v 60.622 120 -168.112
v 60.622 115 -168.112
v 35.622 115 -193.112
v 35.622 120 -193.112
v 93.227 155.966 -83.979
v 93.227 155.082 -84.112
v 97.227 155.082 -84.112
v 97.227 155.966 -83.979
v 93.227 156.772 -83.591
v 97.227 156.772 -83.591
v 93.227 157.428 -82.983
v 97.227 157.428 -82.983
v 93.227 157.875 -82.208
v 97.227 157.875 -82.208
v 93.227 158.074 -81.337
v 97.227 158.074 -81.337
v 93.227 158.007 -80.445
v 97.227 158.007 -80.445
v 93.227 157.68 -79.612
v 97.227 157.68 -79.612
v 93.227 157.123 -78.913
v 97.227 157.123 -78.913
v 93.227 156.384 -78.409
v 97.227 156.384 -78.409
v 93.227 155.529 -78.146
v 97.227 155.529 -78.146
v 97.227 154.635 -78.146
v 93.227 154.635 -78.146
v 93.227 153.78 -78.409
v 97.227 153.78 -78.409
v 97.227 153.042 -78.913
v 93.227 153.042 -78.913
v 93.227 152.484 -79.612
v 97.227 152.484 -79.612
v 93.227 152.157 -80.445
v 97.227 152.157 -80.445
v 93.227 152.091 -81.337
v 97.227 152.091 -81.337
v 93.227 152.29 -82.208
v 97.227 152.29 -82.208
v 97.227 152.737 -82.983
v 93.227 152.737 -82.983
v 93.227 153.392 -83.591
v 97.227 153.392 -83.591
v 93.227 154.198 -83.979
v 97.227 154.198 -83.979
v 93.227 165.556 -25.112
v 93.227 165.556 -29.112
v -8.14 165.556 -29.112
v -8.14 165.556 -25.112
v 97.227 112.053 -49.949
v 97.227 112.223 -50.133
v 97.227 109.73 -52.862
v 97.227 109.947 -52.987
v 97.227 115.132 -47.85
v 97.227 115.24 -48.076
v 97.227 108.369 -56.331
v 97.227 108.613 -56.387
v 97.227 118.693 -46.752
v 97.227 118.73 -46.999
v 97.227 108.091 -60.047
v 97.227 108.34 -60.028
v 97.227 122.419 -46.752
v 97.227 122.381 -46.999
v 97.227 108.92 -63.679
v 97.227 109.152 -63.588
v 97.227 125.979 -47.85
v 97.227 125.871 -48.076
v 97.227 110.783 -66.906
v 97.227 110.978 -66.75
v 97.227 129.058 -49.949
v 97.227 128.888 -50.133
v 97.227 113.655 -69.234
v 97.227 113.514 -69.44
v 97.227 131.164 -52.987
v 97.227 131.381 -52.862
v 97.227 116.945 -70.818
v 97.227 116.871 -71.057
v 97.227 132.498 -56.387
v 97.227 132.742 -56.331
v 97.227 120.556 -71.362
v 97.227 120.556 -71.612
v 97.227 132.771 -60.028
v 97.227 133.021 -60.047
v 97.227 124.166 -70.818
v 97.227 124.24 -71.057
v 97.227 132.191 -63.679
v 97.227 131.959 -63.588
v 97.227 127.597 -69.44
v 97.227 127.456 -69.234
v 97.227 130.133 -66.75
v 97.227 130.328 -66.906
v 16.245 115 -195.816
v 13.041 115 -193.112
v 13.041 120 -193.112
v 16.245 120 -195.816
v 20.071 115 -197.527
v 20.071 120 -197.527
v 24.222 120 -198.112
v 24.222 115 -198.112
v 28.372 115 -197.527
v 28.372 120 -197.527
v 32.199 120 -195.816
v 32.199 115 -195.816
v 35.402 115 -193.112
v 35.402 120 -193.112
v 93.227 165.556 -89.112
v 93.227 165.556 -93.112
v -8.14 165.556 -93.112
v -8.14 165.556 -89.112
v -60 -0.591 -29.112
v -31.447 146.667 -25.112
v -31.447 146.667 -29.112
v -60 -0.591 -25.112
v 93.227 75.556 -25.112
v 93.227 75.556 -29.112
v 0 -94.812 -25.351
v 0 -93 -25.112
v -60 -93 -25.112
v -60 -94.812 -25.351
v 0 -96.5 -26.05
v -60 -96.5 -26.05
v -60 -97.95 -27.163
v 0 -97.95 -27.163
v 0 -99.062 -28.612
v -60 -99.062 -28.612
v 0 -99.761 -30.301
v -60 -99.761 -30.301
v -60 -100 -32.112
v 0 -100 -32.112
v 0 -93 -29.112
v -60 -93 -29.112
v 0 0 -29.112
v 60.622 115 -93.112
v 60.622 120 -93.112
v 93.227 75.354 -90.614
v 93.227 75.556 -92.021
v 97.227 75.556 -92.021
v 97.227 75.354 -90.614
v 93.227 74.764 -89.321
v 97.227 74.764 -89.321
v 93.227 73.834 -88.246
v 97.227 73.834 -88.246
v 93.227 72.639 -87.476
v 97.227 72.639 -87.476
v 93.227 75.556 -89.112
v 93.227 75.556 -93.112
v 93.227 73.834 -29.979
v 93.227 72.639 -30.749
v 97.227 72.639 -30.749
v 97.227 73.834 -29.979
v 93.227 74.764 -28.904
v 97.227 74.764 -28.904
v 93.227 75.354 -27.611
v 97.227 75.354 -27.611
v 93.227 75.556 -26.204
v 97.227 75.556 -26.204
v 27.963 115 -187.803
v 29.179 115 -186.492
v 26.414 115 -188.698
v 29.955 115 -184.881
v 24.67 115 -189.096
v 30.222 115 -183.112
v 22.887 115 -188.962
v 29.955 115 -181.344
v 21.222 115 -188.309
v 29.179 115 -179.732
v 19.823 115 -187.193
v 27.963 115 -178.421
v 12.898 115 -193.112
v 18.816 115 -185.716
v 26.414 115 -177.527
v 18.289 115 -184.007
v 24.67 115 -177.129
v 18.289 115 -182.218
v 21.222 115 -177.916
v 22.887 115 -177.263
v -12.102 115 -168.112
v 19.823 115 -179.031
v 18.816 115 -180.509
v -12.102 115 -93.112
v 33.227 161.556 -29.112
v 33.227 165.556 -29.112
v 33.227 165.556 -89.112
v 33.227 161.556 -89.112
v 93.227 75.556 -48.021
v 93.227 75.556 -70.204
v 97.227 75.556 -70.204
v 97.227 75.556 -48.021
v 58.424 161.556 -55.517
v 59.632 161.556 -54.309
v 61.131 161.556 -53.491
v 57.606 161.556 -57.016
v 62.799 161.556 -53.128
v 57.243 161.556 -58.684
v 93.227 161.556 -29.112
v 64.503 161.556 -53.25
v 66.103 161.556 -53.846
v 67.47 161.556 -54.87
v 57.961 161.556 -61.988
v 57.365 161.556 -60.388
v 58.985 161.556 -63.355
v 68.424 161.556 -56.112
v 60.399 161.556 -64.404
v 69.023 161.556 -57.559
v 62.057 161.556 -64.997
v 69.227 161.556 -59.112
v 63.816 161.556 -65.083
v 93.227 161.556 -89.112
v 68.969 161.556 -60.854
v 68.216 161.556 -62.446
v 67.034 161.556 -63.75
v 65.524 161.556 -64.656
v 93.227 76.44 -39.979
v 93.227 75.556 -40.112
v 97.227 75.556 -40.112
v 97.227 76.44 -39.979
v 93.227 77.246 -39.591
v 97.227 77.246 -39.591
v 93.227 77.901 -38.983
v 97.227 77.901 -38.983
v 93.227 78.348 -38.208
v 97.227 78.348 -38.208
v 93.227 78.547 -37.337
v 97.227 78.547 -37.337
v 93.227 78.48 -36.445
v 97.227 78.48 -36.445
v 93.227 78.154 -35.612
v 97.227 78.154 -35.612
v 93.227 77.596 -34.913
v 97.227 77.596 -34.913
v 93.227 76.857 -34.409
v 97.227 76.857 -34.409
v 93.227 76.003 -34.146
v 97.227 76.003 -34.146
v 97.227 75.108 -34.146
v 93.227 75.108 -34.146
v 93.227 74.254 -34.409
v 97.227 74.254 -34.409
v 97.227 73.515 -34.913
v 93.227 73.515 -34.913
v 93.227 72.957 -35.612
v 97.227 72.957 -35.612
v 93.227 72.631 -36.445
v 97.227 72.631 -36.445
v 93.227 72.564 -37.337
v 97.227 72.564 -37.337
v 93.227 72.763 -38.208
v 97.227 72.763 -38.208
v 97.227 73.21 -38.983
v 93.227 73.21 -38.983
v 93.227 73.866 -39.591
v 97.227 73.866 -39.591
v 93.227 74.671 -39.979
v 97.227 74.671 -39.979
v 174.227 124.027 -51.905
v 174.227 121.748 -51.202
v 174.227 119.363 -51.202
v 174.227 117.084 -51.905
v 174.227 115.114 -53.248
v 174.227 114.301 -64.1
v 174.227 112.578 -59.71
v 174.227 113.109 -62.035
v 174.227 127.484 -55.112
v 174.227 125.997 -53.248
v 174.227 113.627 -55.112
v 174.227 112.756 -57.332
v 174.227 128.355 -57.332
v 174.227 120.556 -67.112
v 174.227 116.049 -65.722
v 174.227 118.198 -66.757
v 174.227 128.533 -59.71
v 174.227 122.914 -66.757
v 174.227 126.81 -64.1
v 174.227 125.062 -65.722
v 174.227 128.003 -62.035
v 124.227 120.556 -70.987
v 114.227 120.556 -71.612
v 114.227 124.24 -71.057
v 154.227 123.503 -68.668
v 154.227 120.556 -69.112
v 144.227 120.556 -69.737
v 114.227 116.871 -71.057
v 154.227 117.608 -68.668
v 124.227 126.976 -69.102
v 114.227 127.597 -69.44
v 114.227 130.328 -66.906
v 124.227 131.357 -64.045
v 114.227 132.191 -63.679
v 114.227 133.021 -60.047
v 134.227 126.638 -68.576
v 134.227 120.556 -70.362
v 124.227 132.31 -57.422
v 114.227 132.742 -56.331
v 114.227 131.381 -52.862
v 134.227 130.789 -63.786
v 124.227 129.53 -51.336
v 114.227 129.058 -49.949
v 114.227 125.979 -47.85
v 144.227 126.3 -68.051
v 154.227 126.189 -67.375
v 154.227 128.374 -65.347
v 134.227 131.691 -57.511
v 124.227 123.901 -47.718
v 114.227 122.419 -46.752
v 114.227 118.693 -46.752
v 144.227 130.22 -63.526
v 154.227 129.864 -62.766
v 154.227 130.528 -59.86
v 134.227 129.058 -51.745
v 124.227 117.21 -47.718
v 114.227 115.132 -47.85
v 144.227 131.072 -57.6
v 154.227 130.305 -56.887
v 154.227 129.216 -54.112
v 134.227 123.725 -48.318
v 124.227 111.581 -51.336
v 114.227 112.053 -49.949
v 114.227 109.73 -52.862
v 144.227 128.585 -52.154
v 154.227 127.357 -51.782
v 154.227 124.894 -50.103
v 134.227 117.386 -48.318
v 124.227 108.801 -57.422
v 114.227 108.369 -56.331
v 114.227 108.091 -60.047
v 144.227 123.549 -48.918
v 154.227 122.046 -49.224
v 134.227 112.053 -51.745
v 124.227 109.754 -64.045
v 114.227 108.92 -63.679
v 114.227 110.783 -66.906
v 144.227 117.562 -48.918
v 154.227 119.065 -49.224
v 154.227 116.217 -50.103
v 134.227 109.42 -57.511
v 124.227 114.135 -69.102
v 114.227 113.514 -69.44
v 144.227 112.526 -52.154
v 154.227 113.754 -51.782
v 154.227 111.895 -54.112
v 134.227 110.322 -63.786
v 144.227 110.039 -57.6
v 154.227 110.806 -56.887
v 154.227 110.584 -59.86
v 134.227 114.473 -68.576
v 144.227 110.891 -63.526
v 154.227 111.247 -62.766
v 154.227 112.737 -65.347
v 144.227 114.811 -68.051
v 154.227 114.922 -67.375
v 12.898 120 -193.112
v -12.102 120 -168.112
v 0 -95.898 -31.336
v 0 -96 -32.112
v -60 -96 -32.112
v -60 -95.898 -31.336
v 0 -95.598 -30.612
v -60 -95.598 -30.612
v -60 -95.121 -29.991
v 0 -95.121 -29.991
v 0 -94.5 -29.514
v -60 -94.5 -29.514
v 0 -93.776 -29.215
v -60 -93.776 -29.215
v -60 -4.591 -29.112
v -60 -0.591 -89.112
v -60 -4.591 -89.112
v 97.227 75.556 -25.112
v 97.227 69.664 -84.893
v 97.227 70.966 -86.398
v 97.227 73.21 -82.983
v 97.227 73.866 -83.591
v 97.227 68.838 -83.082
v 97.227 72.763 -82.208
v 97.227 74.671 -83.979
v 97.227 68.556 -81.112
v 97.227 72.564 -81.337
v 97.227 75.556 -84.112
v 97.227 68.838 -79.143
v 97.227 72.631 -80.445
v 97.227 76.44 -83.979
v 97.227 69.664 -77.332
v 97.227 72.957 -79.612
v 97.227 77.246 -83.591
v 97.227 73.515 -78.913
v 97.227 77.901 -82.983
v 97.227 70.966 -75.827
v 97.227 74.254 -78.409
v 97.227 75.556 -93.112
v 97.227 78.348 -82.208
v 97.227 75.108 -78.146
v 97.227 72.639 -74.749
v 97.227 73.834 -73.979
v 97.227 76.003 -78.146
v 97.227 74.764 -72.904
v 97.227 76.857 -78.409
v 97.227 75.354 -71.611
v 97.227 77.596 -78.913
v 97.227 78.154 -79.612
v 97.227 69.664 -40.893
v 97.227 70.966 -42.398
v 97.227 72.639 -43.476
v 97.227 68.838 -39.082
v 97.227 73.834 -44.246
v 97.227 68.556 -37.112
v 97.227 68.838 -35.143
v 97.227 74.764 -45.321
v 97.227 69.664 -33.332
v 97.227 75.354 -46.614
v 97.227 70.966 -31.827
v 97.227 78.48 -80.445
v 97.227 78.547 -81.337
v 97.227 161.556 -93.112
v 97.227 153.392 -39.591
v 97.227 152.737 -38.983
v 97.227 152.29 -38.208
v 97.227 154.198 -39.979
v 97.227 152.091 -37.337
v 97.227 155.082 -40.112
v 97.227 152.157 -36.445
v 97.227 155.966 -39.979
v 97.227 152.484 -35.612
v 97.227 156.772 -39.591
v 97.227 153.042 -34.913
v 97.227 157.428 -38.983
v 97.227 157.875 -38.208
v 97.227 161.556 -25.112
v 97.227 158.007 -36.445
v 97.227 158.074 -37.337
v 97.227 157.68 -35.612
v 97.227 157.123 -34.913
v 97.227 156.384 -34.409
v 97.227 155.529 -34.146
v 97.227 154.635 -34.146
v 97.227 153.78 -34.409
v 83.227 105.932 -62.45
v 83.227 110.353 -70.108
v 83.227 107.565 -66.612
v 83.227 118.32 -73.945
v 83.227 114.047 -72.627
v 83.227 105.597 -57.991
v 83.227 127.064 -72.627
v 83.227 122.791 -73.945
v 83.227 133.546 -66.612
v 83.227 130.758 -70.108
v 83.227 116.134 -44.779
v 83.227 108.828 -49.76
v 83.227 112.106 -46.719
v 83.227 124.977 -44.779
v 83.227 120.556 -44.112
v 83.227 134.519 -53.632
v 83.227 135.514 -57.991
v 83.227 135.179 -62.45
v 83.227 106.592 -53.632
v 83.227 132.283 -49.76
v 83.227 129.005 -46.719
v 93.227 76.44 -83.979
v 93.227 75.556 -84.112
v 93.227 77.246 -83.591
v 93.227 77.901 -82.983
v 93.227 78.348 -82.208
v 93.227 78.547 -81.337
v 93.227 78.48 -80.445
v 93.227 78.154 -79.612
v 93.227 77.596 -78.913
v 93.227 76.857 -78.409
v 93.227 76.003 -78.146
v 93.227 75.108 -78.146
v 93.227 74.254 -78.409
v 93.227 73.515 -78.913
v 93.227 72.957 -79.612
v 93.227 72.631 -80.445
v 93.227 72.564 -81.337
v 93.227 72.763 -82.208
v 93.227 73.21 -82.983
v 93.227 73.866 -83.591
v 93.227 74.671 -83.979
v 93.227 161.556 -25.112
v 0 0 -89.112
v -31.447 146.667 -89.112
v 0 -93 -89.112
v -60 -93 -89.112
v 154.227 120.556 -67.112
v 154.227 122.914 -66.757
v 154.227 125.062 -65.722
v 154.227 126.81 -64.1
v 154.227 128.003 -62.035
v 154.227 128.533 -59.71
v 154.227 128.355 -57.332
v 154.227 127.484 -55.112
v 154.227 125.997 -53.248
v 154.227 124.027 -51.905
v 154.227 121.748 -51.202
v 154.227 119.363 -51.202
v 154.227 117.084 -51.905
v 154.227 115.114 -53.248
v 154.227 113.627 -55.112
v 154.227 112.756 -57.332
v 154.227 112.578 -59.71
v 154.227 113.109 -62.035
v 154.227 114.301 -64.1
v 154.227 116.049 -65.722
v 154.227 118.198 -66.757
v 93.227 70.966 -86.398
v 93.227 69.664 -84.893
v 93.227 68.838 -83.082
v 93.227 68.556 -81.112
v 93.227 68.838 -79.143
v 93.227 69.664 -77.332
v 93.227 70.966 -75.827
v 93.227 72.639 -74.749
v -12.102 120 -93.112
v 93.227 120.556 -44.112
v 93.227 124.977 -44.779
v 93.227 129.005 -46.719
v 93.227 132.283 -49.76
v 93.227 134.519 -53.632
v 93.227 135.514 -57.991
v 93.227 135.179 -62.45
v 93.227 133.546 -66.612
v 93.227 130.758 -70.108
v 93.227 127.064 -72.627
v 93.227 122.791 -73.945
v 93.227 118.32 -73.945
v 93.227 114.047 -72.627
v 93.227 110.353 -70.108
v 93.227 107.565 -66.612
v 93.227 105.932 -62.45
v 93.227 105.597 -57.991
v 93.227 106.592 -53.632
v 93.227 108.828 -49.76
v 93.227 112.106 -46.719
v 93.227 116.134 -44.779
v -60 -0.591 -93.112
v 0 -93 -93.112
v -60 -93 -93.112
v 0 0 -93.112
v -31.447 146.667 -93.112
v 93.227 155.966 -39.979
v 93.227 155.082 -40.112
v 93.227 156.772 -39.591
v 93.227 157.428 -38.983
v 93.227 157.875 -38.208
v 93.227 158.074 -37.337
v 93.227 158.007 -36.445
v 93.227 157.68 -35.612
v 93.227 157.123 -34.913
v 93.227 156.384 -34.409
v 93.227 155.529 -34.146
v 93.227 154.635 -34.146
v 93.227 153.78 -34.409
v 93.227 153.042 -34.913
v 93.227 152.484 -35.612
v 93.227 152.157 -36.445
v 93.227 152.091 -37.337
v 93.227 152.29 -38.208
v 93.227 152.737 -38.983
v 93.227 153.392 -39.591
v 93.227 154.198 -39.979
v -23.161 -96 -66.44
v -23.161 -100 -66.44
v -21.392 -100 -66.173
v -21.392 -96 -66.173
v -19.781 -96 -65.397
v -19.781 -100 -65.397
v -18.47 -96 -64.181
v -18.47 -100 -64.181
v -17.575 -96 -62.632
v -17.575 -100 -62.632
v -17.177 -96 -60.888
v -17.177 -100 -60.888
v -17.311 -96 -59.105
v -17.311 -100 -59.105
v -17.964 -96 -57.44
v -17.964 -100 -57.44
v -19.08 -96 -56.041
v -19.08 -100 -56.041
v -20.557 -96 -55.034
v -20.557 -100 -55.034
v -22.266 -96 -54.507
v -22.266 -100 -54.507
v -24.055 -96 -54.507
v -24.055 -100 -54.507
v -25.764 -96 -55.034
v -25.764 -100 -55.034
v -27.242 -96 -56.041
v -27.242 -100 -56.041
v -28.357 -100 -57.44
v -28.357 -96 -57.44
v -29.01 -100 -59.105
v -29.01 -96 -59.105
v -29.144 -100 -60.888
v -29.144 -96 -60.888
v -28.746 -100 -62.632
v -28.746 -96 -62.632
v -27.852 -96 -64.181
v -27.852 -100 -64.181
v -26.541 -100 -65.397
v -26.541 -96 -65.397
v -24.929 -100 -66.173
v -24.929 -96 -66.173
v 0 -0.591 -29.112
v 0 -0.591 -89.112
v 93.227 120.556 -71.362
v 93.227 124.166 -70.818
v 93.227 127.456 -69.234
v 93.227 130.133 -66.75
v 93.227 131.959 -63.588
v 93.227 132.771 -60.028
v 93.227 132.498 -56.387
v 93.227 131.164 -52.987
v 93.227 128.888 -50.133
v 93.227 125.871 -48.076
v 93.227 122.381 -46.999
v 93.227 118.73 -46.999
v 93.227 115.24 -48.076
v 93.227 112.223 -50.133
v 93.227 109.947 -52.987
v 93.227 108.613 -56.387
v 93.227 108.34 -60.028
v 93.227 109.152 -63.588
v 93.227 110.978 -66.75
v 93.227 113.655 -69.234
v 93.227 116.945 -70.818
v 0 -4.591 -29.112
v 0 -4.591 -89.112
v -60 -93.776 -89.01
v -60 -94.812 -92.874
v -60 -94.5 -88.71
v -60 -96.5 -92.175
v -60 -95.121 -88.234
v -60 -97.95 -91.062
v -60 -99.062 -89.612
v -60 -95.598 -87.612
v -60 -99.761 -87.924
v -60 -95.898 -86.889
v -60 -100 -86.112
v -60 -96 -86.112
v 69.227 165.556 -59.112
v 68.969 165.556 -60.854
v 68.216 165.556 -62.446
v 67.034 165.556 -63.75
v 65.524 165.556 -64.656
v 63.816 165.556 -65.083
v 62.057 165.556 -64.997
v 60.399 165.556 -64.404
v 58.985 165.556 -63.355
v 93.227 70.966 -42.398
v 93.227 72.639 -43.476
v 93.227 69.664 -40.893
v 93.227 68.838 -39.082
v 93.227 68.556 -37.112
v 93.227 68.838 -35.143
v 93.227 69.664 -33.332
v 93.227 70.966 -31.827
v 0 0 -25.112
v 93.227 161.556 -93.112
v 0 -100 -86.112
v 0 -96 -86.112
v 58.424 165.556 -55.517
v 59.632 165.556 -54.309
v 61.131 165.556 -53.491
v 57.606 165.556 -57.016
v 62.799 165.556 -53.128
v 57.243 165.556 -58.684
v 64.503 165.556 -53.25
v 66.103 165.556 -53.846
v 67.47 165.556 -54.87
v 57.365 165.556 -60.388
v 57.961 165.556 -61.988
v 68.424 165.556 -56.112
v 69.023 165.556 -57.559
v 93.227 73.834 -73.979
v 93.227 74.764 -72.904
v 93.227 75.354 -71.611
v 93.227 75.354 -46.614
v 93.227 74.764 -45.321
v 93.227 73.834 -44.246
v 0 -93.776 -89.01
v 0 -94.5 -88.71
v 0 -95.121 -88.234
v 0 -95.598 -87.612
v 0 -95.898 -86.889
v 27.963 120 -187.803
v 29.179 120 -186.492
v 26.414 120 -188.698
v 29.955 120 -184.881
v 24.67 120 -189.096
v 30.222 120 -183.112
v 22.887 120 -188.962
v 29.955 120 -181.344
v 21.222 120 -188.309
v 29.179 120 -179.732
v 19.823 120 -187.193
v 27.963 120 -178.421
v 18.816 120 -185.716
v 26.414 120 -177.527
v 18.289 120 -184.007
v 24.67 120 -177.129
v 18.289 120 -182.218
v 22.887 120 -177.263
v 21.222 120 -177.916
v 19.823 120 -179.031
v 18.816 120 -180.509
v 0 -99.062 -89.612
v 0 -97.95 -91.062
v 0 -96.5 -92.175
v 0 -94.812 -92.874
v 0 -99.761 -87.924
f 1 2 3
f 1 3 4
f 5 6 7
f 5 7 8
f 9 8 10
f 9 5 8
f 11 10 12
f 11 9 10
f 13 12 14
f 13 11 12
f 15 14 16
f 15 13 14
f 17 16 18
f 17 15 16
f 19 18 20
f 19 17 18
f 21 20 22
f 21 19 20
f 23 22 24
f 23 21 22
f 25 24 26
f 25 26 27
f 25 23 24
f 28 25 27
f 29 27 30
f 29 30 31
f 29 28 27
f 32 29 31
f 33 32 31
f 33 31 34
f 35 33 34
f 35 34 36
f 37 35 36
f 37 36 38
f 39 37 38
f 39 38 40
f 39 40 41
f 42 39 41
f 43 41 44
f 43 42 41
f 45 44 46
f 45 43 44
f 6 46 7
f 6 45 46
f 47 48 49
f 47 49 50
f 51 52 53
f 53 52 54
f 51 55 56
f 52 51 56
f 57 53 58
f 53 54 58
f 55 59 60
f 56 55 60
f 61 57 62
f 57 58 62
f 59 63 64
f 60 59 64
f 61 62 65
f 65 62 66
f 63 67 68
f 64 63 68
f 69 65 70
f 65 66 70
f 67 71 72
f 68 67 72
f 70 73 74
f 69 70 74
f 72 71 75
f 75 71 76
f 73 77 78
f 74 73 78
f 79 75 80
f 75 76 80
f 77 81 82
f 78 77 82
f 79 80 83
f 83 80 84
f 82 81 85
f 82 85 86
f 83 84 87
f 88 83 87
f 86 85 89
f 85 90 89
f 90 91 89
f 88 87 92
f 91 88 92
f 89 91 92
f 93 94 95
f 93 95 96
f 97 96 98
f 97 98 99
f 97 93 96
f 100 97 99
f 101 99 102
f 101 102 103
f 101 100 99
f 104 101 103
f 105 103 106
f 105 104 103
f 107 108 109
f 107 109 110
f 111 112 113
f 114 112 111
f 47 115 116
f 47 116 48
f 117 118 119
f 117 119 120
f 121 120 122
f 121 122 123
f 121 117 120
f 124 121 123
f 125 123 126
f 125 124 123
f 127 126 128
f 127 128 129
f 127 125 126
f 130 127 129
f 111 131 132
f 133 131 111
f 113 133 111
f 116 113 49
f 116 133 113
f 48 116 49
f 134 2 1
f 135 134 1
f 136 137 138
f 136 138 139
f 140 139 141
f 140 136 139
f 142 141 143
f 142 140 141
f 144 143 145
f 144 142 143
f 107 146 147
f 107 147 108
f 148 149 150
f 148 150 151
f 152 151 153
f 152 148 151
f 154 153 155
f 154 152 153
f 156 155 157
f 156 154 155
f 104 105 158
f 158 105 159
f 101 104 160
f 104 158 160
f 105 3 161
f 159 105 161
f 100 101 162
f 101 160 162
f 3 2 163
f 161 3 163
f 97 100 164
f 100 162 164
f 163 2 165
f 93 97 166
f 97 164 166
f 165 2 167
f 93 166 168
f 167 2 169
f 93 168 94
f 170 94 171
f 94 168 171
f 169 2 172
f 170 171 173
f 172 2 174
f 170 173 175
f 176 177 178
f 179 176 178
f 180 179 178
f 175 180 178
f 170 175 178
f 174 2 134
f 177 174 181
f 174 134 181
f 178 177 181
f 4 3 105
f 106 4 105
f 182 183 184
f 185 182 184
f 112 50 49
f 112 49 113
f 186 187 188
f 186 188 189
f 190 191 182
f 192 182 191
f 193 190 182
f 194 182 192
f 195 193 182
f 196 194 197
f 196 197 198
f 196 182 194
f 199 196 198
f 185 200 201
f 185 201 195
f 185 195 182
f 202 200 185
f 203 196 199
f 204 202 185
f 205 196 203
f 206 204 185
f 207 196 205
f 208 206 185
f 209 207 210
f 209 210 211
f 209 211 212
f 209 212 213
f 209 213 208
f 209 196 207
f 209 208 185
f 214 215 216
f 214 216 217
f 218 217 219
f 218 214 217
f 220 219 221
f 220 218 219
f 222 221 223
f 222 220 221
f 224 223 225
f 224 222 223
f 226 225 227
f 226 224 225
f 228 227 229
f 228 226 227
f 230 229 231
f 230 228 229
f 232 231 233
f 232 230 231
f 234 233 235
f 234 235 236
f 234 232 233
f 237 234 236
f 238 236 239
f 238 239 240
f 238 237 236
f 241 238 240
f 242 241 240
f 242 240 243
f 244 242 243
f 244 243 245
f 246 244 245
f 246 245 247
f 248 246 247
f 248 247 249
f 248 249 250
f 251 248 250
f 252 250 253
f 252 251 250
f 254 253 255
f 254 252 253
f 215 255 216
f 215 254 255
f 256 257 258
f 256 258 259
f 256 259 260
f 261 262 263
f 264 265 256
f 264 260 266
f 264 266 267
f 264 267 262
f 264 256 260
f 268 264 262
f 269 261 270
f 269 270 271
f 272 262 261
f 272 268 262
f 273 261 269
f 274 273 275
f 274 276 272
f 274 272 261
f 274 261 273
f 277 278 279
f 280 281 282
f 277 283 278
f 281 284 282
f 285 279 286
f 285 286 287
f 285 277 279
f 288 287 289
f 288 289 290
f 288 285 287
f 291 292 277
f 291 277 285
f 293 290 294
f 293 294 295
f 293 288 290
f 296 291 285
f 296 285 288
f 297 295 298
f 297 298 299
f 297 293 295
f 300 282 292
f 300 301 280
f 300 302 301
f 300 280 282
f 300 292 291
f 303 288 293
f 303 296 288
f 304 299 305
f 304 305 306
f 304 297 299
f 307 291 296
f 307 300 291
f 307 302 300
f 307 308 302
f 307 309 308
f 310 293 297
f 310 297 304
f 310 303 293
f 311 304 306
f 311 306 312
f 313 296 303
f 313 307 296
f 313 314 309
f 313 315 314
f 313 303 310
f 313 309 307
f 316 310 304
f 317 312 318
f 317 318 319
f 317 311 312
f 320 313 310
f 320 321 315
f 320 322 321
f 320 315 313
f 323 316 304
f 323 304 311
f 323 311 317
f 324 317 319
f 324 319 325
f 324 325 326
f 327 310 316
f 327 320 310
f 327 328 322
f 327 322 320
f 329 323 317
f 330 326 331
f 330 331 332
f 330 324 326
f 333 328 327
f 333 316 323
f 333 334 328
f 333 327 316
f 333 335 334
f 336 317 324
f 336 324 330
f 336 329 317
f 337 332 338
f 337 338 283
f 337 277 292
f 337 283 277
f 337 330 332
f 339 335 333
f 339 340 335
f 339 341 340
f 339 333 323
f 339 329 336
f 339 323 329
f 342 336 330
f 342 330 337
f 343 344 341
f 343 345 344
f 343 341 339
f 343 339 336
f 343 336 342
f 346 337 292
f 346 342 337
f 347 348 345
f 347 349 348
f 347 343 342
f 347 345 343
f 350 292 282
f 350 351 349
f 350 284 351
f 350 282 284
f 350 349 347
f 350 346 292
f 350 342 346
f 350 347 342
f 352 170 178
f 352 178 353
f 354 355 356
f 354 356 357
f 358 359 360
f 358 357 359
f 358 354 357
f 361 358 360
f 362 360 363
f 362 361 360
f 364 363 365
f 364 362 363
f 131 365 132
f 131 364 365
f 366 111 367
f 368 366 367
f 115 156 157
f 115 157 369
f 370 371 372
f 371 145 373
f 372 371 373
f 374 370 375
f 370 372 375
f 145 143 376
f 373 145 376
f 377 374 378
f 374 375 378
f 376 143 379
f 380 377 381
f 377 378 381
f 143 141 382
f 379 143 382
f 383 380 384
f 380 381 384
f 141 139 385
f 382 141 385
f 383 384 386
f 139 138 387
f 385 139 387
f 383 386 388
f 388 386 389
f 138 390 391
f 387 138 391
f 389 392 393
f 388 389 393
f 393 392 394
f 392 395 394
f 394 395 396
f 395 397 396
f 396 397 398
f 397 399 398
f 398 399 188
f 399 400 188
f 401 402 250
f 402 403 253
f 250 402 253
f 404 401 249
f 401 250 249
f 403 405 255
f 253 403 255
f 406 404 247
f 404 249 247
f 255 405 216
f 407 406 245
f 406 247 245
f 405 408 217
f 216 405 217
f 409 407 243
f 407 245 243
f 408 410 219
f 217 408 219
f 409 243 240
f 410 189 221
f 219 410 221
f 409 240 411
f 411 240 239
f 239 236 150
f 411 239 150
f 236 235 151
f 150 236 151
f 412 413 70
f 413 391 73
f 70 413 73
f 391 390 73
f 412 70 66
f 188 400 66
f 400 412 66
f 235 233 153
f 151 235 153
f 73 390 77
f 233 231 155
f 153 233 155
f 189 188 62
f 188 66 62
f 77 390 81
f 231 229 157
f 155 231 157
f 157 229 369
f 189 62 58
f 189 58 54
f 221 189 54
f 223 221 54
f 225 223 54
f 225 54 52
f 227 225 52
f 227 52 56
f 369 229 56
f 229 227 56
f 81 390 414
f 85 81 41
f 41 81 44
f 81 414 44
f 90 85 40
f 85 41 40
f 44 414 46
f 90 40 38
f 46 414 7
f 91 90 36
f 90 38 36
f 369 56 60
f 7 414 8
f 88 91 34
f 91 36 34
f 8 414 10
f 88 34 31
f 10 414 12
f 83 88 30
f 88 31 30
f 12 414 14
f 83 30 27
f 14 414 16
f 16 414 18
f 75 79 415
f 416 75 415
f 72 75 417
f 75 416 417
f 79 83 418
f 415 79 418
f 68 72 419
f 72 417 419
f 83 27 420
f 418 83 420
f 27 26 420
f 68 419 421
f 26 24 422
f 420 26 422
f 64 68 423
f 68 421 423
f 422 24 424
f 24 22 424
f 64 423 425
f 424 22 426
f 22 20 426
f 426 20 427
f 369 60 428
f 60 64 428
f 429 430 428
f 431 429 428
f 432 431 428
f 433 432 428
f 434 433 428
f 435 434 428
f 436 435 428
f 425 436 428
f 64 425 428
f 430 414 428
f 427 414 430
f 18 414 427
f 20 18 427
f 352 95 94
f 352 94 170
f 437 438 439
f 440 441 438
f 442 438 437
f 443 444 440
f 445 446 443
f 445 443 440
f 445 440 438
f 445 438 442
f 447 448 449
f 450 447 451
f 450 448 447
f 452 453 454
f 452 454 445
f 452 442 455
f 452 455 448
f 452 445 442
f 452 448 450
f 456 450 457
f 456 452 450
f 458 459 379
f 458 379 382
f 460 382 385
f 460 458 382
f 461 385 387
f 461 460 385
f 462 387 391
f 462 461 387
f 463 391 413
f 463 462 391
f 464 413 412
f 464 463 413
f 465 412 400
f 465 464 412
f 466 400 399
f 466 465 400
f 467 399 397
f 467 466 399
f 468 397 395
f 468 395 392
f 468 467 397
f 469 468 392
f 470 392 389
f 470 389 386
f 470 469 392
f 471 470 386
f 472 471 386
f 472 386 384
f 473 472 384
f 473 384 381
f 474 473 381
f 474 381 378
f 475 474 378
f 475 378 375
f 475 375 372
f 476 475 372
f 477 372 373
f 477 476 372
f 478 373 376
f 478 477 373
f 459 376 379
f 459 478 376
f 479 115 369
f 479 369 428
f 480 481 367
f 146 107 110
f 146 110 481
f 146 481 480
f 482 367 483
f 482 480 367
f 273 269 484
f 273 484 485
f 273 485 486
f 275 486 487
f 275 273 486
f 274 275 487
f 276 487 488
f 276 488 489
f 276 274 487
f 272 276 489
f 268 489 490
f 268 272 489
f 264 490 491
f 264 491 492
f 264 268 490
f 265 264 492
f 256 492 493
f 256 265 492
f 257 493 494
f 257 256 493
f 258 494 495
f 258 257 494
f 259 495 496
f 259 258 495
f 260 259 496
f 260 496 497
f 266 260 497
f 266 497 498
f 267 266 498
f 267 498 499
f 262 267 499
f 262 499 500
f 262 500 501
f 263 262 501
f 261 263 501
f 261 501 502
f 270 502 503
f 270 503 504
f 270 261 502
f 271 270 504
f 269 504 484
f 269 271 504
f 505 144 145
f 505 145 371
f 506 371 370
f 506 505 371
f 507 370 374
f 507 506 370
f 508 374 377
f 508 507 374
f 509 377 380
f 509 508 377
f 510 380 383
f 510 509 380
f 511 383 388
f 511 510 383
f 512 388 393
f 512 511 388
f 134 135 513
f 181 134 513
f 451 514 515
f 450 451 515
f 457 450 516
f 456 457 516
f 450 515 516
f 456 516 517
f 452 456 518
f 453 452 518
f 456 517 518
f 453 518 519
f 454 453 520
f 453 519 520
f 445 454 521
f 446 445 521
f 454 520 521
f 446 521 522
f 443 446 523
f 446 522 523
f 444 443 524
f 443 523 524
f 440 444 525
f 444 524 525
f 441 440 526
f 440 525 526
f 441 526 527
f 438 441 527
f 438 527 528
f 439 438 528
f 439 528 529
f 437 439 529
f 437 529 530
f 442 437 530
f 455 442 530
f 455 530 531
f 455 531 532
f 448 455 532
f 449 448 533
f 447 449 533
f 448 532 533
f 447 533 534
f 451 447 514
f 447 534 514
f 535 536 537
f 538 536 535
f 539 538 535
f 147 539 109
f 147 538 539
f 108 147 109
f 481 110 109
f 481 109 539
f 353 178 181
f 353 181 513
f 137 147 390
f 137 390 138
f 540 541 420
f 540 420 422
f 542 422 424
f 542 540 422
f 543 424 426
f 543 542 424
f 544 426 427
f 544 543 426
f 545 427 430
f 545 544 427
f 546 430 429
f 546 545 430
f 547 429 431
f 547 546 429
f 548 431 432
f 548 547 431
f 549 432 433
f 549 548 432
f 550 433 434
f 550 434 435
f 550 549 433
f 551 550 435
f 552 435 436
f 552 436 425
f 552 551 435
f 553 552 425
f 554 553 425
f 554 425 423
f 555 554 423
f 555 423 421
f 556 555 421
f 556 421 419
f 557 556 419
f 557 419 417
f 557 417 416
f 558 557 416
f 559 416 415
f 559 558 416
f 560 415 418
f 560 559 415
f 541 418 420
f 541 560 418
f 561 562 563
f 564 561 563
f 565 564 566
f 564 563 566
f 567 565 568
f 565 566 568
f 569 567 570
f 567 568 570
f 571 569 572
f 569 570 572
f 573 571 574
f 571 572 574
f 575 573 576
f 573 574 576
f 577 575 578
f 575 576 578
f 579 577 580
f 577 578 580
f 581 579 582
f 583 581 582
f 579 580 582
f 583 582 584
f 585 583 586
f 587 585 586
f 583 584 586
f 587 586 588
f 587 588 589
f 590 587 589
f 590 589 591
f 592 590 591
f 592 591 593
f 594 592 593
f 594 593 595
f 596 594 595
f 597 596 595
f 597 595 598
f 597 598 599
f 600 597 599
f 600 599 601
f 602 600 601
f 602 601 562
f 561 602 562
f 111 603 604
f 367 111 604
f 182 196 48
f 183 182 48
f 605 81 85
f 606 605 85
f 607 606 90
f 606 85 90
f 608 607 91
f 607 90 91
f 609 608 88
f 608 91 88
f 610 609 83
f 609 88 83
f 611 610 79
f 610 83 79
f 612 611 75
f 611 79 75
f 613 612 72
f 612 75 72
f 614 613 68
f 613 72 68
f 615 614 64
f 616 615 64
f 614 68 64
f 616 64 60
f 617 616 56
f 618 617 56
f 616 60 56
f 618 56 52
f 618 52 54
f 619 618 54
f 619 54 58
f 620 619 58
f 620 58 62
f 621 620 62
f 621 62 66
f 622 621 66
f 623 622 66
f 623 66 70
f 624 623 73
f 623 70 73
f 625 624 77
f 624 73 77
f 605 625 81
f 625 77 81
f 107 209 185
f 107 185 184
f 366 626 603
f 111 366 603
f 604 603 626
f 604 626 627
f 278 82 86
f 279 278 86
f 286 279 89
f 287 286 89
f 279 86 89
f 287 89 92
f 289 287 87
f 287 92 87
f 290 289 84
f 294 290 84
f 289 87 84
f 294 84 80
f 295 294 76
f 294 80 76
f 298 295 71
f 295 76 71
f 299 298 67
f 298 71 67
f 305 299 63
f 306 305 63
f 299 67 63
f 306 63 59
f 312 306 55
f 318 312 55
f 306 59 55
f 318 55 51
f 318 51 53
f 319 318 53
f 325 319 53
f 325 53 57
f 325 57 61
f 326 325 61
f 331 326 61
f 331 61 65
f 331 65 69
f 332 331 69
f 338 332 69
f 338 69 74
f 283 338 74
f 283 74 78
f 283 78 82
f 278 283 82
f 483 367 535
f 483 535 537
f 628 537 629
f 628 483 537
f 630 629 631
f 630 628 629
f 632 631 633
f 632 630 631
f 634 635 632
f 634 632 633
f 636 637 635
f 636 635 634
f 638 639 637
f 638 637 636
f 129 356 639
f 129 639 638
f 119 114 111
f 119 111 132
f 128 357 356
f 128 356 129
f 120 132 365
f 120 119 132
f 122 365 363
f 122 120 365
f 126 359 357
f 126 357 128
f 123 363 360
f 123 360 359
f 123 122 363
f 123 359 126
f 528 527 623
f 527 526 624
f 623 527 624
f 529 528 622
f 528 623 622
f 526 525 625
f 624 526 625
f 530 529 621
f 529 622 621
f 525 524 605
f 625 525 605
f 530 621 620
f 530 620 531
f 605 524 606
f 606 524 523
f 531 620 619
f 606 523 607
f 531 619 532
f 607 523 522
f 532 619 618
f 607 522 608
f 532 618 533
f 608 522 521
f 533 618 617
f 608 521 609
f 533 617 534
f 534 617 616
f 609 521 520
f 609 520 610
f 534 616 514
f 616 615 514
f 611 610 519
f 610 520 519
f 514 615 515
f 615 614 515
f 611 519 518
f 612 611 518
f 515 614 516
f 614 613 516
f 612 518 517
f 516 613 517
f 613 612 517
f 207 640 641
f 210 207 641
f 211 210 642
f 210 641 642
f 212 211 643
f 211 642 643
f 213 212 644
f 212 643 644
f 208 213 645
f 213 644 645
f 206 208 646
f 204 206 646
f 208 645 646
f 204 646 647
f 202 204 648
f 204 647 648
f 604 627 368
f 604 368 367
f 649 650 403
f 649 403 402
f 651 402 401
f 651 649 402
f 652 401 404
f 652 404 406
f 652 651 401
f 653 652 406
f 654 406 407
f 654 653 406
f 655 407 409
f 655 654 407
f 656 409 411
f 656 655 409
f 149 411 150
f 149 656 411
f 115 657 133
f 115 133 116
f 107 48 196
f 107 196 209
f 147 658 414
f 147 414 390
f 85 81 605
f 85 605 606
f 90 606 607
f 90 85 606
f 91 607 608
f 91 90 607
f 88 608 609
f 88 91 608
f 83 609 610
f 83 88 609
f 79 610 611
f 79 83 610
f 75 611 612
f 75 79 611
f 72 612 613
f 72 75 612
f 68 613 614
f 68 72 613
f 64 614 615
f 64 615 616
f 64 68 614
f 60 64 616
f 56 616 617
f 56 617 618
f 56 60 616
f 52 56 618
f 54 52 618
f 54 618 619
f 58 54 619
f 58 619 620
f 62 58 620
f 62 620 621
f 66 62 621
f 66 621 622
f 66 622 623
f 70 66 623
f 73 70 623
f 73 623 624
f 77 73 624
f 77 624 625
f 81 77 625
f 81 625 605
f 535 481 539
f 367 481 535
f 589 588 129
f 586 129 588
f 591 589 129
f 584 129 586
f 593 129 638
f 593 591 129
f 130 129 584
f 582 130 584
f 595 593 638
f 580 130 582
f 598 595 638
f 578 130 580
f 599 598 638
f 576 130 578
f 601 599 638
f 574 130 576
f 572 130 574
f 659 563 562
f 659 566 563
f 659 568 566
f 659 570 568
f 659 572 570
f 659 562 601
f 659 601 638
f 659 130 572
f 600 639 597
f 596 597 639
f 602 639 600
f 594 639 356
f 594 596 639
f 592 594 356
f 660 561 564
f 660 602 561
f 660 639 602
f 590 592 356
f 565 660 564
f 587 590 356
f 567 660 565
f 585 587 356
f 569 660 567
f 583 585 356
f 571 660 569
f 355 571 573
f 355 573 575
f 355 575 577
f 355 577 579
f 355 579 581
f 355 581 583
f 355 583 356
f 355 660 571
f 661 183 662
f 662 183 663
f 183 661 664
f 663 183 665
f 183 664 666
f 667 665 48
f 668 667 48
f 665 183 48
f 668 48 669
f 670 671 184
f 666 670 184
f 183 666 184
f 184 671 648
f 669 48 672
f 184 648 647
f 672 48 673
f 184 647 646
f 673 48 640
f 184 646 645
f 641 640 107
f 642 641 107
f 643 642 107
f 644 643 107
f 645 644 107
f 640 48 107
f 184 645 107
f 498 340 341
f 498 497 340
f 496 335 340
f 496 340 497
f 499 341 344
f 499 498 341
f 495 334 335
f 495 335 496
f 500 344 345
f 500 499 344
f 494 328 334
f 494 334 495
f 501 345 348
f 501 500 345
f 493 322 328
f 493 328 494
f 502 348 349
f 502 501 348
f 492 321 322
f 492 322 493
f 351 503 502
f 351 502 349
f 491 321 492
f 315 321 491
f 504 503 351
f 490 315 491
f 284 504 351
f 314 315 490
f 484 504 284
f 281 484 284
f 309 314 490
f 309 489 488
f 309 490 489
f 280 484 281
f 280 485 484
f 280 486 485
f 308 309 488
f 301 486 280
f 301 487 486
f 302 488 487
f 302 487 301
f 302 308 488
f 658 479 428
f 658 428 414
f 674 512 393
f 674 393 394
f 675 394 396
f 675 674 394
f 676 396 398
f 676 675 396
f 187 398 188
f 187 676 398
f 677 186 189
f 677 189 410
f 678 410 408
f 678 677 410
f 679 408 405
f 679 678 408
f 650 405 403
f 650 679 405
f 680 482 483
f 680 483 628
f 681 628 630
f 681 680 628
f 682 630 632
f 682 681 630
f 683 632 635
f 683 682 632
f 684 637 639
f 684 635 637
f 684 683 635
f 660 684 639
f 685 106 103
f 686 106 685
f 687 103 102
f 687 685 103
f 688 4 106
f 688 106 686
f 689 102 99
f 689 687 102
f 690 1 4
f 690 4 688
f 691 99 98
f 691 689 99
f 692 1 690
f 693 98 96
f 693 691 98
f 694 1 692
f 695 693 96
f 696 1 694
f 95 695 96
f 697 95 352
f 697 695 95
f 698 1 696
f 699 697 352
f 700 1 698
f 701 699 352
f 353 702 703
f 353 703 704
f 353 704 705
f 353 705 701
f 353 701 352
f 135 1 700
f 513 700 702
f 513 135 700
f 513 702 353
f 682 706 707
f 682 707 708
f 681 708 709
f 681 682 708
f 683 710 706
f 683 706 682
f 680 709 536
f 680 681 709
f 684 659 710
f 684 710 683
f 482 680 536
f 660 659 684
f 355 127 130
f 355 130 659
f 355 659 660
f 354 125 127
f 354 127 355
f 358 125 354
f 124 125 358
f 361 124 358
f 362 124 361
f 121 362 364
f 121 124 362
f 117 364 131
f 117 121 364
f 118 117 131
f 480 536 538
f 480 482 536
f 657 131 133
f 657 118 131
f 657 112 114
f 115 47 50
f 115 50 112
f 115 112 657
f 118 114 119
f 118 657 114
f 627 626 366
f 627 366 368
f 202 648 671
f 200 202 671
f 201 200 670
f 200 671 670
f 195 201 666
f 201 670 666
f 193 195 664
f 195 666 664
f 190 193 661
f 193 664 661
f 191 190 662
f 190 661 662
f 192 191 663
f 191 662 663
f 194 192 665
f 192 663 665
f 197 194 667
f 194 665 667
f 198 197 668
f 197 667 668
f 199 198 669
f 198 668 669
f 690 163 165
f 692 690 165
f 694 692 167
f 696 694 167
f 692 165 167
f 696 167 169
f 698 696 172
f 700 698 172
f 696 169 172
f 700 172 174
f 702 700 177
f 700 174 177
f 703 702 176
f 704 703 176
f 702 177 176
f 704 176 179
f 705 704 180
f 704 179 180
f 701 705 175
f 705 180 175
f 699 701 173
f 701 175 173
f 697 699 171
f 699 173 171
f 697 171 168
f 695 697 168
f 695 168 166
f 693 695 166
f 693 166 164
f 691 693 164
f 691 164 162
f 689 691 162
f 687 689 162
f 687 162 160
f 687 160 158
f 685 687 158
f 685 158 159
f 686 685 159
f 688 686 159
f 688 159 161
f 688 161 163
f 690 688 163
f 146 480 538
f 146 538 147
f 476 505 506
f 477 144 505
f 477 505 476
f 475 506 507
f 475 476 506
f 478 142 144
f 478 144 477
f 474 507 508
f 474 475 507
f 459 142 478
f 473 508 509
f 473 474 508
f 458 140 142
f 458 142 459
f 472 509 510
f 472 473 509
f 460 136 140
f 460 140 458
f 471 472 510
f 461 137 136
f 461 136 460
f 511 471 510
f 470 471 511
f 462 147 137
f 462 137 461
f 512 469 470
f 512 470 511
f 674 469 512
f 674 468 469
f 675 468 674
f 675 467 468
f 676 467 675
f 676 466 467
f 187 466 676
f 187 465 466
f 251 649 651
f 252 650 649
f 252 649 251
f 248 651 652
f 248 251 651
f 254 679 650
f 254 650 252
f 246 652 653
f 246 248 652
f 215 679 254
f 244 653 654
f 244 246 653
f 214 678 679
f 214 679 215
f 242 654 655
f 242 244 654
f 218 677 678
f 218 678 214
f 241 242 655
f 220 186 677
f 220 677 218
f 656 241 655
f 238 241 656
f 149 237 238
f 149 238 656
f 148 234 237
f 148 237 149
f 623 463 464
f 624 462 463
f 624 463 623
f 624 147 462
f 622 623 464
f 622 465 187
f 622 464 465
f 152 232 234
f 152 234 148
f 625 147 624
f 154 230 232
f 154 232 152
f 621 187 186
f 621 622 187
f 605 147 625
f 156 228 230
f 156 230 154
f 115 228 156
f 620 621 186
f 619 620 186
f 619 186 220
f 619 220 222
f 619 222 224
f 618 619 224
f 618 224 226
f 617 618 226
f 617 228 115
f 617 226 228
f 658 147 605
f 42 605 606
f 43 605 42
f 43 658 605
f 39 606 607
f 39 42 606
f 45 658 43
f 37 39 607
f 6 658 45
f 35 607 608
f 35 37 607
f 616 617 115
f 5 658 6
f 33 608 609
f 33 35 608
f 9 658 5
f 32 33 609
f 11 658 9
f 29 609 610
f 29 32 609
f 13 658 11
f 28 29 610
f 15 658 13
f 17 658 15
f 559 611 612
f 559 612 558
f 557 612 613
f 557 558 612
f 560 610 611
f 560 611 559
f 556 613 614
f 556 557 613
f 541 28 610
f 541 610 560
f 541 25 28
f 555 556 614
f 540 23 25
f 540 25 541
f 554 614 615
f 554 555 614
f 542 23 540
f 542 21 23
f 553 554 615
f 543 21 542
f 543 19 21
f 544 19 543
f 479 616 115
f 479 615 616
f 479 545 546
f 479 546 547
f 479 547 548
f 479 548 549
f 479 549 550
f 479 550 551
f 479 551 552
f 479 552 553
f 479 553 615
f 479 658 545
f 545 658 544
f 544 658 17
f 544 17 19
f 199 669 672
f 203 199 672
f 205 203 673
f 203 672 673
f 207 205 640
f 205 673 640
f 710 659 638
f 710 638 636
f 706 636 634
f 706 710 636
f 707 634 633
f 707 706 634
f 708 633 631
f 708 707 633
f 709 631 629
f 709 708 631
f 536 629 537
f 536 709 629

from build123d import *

# Parameters (mm, degrees)
BOSS_EXTRUDE2_DEPTH  = 107
CUT_EXTRUDE1_DEPTH   = 214
SKETCH5_W            = 60
SKETCH5_H            = 4
BOSS_EXTRUDE3_DEPTH  = 60
SKETCH6_W            = 60
SKETCH6_H            = 4
BOSS_EXTRUDE4_DEPTH  = 60
SKETCH7_R            = 3
BOSS_EXTRUDE5_DEPTH  = 4
SKETCH8_W            = 72.723840611
SKETCH8_H            = 5
BOSS_EXTRUDE6_DEPTH  = 100
CHAMFER1_SIZE        = 25
CHAMFER2_SIZE        = 25
SKETCH9_R            = 15
BOSS_EXTRUDE7_DEPTH  = 5
SKETCH10_R           = 12.25
CUT_EXTRUDE2_DEPTH   = 4
CUT_EXTRUDE5_DEPTH   = 8
SKETCH13_R           = 6
CUT_EXTRUDE6_DEPTH   = 10
SKETCH15_R           = 15
BOSS_EXTRUDE8_DEPTH  = 10
SKETCH16_R           = 12.25
BOSS_EXTRUDE9_DEPTH  = 10
SKETCH17_R           = 12.5
BOSS_EXTRUDE10_DEPTH = 77
SKETCH18_R           = 12.5
SKETCH18_R_2         = 8
CUT_EXTRUDE7_DEPTH   = 20
CHAMFER3_SIZE        = 40
CHAMFER3_SIZE2       = 2.5
SKETCH19_R           = 6
CUT_EXTRUDE8_DEPTH   = 20


with BuildPart() as part:
    # Sketch3 → Boss-Extrude2 (new, symmetric)
    with BuildSketch(Plane(origin=(0, 0, 0), x_dir=(0, 0, -1), z_dir=(1, 0, 0))):
        with BuildLine():
            Line((93.112387021, -93), (93.112387021, 165.555555556))
            Line((93.112387021, 165.555555556), (89.112387021, 165.555555556))
            Line((89.112387021, 165.555555556), (89.112387021, -93))
            ThreePointArc((89.112387021, -93), (88.233707365, -95.121320344), (86.112387021, -96))
            Line((86.112387021, -96), (32.112387021, -96))
            ThreePointArc((32.112387021, -96), (29.991066678, -95.121320344), (29.112387021, -93))
            Line((29.112387021, -93), (29.112387021, 165.555555556))
            Line((29.112387021, 165.555555556), (25.112387021, 165.555555556))
            Line((25.112387021, 165.555555556), (25.112387021, -93))
            ThreePointArc((25.112387021, -93), (27.162639553, -97.949747468), (32.112387021, -100))
            Line((32.112387021, -100), (86.112387021, -100))
            ThreePointArc((86.112387021, -100), (91.06213449, -97.949747468), (93.112387021, -93))
        make_face()
    extrude(amount=BOSS_EXTRUDE2_DEPTH, both=True)

    # Sketch4 → Cut-Extrude1 (cut)
    with BuildSketch(Plane.XY):
        Polygon((-190, 11.896699378), (-190, -230), (130, -230), (130, -61.975068301), (223.227453171, 13.580487255), (223.227453171, 295.555555556), (-54.204269584, 295.555555556), (-150.061773181, 217.868493514), align=None)
        Polygon((-60, -0.59060332), (-60, -100), (0, -100), (0, 0), (93.227453171, 75.555555556), (93.227453171, 165.555555556), (-8.139740481, 165.555555556), (-31.446603774, 146.666666667), align=None, mode=Mode.SUBTRACT)
    extrude(amount=-CUT_EXTRUDE1_DEPTH, mode=Mode.SUBTRACT)

    # Sketch13 → Cut-Extrude6 (cut)
    with BuildSketch(Plane.XZ.offset(100)):
        with Locations(Location((-23.160596036, -60.439663785, 0), (0, 0, 270))):
            Circle(SKETCH13_R)
    extrude(amount=-CUT_EXTRUDE6_DEPTH, mode=Mode.SUBTRACT)


with BuildPart() as body_2:
    # Sketch5 → Boss-Extrude3 (new body)
    with BuildSketch(Plane(origin=(0, 0, 0), x_dir=(0, 0, -1), z_dir=(1, 0, 0))):
        with Locations((59.112387021, -2.59060332)):
            Rectangle(SKETCH5_W, SKETCH5_H)
    extrude(amount=-BOSS_EXTRUDE3_DEPTH)


with BuildPart() as body_3:
    # Sketch6 → Boss-Extrude4 (new body)
    with BuildSketch(Plane(origin=(93.227453171, 0, 0), x_dir=(0, 0, -1), z_dir=(1, 0, 0))):
        with Locations((59.112387021, 163.555555556)):
            Rectangle(SKETCH6_W, SKETCH6_H)
    extrude(amount=-BOSS_EXTRUDE4_DEPTH)

    # Sketch12 → Cut-Extrude5 (cut)
    with BuildSketch(Plane(origin=(0, 165.555555556, 0), x_dir=(1, 0, 0), z_dir=(0, 1, 0))):
        with BuildLine():
            ThreePointArc((69.227453171, 59.112387021), (65.523553765, 64.655664216), (58.984812484, 63.355027708))
            Line((58.984812484, 63.355027708), (67.470093858, 54.869746334))
            ThreePointArc((67.470093858, 54.869746334), (68.770730366, 56.816286427), (69.227453171, 59.112387021))
        make_face()
        with BuildLine():
            Line((67.470093858, 54.869746334), (58.984812484, 63.355027708))
            ThreePointArc((58.984812484, 63.355027708), (58.984812484, 54.869746334), (67.470093858, 54.869746334))
        make_face()
    extrude(amount=-CUT_EXTRUDE5_DEPTH, mode=Mode.SUBTRACT)


with BuildPart() as body_4:
    # Sketch7 → Boss-Extrude5 (new body)
    with BuildSketch(Plane(origin=(93.227453171, 0, 0), x_dir=(0, 0, -1), z_dir=(1, 0, 0))):
        with BuildLine():
            Line((25.112387021, 161.555555556), (93.112387021, 161.555555556))
            Line((93.112387021, 161.555555556), (93.112387021, 75.555555556))
            Line((93.112387021, 75.555555556), (92.021099136, 75.555555556))
            ThreePointArc((92.021099136, 75.555555556), (89.320790512, 74.763682613), (87.475802422, 72.638888889))
            ThreePointArc((87.475802422, 72.638888889), (81.112387021, 68.555555556), (74.748971621, 72.638888889))
            ThreePointArc((74.748971621, 72.638888889), (72.903983531, 74.763682613), (70.203674907, 75.555555556))
            Line((70.203674907, 75.555555556), (48.021099136, 75.555555556))
            ThreePointArc((48.021099136, 75.555555556), (45.320790512, 74.763682613), (43.475802422, 72.638888889))
            ThreePointArc((43.475802422, 72.638888889), (37.112387021, 68.555555556), (30.748971621, 72.638888889))
            ThreePointArc((30.748971621, 72.638888889), (28.903983531, 74.763682613), (26.203674907, 75.555555556))
            Line((26.203674907, 75.555555556), (25.112387021, 75.555555556))
            Line((25.112387021, 75.555555556), (25.112387021, 161.555555556))
        make_face()
        with Locations((37.112387021, 155.082134103)):
            Circle(SKETCH7_R, mode=Mode.SUBTRACT)
        with Locations((81.112387021, 155.082134103)):
            Circle(SKETCH7_R, mode=Mode.SUBTRACT)
        with Locations((37.112387021, 75.555555556)):
            Circle(SKETCH7_R, mode=Mode.SUBTRACT)
        with Locations((81.112387021, 75.555555556)):
            Circle(SKETCH7_R, mode=Mode.SUBTRACT)
    extrude(amount=BOSS_EXTRUDE5_DEPTH)

    # Sketch10 → Cut-Extrude2 (cut)
    with BuildSketch(Plane(origin=(97.227453171, 0, 0), x_dir=(0, 0, -1), z_dir=(1, 0, 0))):
        with Locations((59.112387021, 120.555555556)):
            Circle(SKETCH10_R)
    extrude(amount=-CUT_EXTRUDE2_DEPTH, mode=Mode.SUBTRACT)


with BuildPart() as body_5:
    # Sketch8 → Boss-Extrude6 (new body)
    with BuildSketch(Plane(origin=(0, 0, -93.112387021), x_dir=(-1, 0, 0), z_dir=(0, 0, -1))):
        with Locations((-24.25985796, 117.5)):
            Rectangle(SKETCH8_W, SKETCH8_H)
    extrude(amount=BOSS_EXTRUDE6_DEPTH)

    # Chamfer1
    chamfer1_edges = [body_5.edges().sort_by_distance(p)[0] for p in [
        (-12.102062346, 117.5, -193.112387021),
    ]]
    chamfer(chamfer1_edges, length=CHAMFER1_SIZE)

    # Chamfer2
    chamfer2_edges = [body_5.edges().sort_by_distance(p)[0] for p in [
        (60.621778265, 117.5, -193.112387021),
    ]]
    chamfer(chamfer2_edges, length=CHAMFER2_SIZE)

    # Sketch9 → Boss-Extrude7 (add)
    with BuildSketch(Plane.XZ.offset(-115)):
        with Locations((24.221778265, -183.112387021)):
            Circle(SKETCH9_R)
    extrude(amount=-BOSS_EXTRUDE7_DEPTH)

    # Sketch19 → Cut-Extrude8 (cut)
    with BuildSketch(Plane.XZ.offset(-115)):
        with Locations((24.221778265, -183.112387021)):
            Circle(SKETCH19_R)
    extrude(amount=-CUT_EXTRUDE8_DEPTH, mode=Mode.SUBTRACT)


with BuildPart() as body_6:
    # Sketch15 → Boss-Extrude8 (new body)
    with BuildSketch(Plane.ZY.offset(-93.227453171)):
        with Locations((-59.112387021, 120.555555556)):
            Circle(SKETCH15_R)
    extrude(amount=BOSS_EXTRUDE8_DEPTH)


with BuildPart() as body_7:
    # Sketch16 → Boss-Extrude9 (new body)
    with BuildSketch(Plane(origin=(97.227453171, 0, 0), x_dir=(0, 0, -1), z_dir=(1, 0, 0))):
        with Locations((59.112387021, 120.555555556)):
            Circle(SKETCH16_R)
    extrude(amount=-BOSS_EXTRUDE9_DEPTH)


with BuildPart() as body_8:
    # Sketch17 → Boss-Extrude10 (new body)
    with BuildSketch(Plane(origin=(97.227453171, 0, 0), x_dir=(0, 0, -1), z_dir=(1, 0, 0))):
        with Locations((59.112387021, 120.555555556)):
            Circle(SKETCH17_R)
    extrude(amount=BOSS_EXTRUDE10_DEPTH)

    # Sketch18 → Cut-Extrude7 (cut)
    with BuildSketch(Plane(origin=(174.227453171, 0, 0), x_dir=(0, 0, -1), z_dir=(1, 0, 0))):
        with Locations((59.112387021, 120.555555556)):
            Circle(SKETCH18_R)
        with Locations((59.112387021, 120.555555556)):
            Circle(SKETCH18_R_2, mode=Mode.SUBTRACT)
    extrude(amount=-CUT_EXTRUDE7_DEPTH, mode=Mode.SUBTRACT)

    # Chamfer3
    chamfer3_edges = [body_8.edges().sort_by_distance(p)[0] for p in [
        (154.227453171, 120.555555556, -46.612387021),
    ]]
    chamfer3_side = [body_8.faces().sort_by_distance(p)[0] for p in [
        (125.727453171, 120.555555556, -46.612387021),
    ]]
    chamfer(chamfer3_edges, length=CHAMFER3_SIZE, length2=CHAMFER3_SIZE2, reference=chamfer3_side[0])

    # Combine1: union body 7, body 6
    add(body_7.part)
    add(body_6.part)


solid = Compound([part.part, body_2.part, body_3.part, body_4.part, body_5.part, body_8.part])
